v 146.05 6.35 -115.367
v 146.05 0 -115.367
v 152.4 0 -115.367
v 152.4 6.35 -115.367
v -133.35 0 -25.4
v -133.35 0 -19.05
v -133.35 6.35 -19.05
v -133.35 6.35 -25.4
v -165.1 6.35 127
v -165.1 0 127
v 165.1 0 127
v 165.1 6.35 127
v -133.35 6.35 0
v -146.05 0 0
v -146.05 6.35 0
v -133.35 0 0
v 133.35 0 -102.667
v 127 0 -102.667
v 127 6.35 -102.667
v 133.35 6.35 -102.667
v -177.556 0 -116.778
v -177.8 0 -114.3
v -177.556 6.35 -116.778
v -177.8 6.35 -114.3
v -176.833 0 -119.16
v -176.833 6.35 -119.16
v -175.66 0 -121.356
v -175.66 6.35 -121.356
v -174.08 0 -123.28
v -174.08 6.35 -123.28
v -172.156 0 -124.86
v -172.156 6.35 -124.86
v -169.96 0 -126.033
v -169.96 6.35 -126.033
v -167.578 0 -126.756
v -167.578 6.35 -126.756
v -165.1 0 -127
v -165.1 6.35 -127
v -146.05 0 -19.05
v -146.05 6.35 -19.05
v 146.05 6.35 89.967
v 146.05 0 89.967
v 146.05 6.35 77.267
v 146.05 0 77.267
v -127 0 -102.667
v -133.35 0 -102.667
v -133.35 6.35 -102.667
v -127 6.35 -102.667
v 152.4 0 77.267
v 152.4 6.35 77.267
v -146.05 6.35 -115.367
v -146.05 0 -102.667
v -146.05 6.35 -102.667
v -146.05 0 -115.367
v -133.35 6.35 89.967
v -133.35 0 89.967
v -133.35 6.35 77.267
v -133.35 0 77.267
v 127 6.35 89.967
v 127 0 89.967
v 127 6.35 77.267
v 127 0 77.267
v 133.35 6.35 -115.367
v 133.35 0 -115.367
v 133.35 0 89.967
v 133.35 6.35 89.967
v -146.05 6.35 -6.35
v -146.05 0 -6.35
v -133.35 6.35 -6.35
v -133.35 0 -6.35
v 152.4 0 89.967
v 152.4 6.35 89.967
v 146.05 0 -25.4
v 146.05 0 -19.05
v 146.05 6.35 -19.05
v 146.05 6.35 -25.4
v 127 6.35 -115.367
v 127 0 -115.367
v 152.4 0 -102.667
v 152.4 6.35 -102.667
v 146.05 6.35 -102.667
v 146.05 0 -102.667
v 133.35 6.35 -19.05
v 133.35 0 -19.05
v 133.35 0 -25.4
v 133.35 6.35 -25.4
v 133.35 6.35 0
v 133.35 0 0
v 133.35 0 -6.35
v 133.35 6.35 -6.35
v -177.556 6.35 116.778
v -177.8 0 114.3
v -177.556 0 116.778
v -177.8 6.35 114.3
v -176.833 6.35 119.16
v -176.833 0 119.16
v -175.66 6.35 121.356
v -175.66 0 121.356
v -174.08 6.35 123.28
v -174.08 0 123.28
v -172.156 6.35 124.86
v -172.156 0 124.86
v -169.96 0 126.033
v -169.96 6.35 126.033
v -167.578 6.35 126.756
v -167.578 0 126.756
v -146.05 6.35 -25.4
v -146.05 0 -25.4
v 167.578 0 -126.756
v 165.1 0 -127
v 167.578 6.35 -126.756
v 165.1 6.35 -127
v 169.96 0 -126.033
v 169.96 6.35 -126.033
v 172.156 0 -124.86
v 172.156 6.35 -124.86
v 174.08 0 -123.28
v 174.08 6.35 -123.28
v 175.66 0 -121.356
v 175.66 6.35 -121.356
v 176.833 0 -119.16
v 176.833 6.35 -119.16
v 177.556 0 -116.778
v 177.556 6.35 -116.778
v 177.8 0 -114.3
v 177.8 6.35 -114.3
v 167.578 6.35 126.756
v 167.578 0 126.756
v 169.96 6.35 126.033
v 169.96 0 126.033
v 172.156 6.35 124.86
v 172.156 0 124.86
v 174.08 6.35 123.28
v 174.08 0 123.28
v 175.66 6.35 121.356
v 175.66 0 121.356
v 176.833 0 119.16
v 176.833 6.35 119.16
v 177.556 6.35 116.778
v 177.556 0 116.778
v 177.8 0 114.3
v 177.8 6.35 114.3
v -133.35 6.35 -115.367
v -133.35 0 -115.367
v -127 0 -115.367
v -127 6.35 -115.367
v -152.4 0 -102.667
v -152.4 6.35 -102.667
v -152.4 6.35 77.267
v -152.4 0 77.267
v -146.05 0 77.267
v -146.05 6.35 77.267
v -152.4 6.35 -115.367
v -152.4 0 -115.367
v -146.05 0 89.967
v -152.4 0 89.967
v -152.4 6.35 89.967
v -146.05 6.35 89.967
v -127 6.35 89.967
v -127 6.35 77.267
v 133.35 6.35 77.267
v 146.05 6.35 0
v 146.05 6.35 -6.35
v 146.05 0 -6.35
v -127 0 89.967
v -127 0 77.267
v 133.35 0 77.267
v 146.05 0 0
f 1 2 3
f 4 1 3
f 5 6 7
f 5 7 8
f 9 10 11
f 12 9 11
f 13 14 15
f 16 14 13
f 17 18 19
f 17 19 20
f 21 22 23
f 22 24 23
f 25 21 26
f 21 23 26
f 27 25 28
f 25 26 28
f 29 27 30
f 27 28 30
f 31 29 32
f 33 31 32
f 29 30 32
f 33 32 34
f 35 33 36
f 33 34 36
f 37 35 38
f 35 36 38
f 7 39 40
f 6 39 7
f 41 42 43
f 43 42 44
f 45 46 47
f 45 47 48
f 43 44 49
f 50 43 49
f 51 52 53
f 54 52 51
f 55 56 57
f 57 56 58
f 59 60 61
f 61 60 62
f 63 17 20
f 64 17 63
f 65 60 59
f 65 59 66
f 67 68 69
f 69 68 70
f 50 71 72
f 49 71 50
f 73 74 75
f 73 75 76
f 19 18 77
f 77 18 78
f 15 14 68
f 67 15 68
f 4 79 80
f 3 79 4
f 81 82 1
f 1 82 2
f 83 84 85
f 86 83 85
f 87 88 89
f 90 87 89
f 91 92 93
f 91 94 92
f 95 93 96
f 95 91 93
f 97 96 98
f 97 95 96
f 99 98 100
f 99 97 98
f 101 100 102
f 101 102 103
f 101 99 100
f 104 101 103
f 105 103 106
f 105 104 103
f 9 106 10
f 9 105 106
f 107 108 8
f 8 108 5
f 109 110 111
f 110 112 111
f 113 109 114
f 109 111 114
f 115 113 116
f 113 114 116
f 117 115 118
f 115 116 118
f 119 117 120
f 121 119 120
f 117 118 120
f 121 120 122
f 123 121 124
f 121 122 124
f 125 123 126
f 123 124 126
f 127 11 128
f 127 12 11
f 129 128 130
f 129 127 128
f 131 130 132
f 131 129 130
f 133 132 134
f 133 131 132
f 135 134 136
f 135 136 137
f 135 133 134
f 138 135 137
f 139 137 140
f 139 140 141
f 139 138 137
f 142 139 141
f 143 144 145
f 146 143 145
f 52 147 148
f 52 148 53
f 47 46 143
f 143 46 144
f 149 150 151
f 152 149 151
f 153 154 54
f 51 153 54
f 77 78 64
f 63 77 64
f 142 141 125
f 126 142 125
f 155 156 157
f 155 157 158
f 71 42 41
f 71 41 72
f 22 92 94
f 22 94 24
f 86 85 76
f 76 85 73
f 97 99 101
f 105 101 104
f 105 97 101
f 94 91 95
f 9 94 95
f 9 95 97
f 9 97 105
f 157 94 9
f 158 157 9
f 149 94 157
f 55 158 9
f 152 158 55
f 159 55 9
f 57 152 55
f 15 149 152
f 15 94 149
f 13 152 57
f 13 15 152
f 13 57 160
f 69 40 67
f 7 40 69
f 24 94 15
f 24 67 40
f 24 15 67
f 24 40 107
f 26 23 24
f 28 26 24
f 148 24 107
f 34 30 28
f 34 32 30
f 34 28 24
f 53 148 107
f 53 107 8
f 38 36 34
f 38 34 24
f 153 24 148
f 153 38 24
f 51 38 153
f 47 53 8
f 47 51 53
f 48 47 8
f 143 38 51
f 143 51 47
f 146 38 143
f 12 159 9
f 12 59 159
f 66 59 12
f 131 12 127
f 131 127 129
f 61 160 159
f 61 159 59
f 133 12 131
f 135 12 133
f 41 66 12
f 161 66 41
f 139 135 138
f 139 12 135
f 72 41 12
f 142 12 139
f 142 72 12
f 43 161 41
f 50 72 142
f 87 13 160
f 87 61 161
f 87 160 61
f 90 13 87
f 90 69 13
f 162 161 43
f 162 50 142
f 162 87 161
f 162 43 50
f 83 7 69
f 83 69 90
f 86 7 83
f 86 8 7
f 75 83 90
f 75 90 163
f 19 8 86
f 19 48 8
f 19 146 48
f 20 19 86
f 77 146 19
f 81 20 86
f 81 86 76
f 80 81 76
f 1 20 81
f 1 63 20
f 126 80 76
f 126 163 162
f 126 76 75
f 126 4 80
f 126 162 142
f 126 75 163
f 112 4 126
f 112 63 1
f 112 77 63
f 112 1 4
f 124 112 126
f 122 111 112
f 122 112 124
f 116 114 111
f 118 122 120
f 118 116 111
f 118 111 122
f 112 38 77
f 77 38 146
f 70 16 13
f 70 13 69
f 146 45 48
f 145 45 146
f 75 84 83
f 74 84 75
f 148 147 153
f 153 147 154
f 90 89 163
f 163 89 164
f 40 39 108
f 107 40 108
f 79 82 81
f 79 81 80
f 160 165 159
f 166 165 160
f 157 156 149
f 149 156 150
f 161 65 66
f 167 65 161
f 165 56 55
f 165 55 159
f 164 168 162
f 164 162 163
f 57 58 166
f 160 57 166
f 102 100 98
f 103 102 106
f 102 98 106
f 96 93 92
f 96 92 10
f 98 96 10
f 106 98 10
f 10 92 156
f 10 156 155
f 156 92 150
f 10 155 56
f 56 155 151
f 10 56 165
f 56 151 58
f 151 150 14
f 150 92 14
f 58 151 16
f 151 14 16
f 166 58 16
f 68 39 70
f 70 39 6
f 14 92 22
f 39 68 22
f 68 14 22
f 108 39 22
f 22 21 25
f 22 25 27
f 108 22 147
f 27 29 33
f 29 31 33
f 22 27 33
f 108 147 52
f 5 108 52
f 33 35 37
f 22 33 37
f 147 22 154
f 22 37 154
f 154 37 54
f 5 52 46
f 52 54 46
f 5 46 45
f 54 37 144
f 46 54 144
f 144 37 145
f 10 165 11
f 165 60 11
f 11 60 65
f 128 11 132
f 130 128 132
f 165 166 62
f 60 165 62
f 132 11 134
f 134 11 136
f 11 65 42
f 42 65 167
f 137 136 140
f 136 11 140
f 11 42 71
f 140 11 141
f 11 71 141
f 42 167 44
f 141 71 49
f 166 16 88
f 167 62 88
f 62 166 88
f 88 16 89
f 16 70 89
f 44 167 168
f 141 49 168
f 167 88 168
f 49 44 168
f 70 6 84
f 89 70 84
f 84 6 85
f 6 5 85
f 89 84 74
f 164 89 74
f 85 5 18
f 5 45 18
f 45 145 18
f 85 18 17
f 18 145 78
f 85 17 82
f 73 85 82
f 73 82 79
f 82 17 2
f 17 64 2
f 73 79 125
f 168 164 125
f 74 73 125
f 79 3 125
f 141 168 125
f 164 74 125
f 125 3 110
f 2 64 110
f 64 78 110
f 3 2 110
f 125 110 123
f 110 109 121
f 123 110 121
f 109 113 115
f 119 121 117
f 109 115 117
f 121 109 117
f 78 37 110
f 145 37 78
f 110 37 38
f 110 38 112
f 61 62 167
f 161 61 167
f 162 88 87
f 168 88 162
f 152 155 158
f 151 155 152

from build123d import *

# Parameters (mm, degrees)
ESQUISSE2_W                  = 355.6
ESQUISSE2_H                  = 254
BOSS_EXTRU_1_DEPTH           = 6.35
ENL_V_MAT_EXTRU_1_DEPTH      = 219.591313871
ENL_V_MAT_EXTRU_1_DEPTH_BACK = 219.591313871
ESQUISSE3_W                  = 12.7
ESQUISSE3_H                  = 6.35
ESQUISSE3_W_2                = 6.35
ESQUISSE3_H_2                = 12.7
CONG_1_R                     = 12.7


with BuildPart() as part:
    # Esquisse2 → Boss.-Extru.1 (new body)
    with BuildSketch(Plane(origin=(0, 0, 0), x_dir=(1, 0, 0), z_dir=(0, 1, 0))):
        Rectangle(ESQUISSE2_W, ESQUISSE2_H)
    extrude(amount=BOSS_EXTRU_1_DEPTH)

    # Esquisse3 → Enlèv. mat.-Extru.1 (cut, two sides: drawn at the far end of the back side and taken through both)
    with BuildSketch(Plane(origin=(0, 6.35, 0), x_dir=(1, 0, 0), z_dir=(0, 1, 0)).offset(-ENL_V_MAT_EXTRU_1_DEPTH_BACK)):
        with Locations((-139.7, 22.225)):
            Rectangle(ESQUISSE3_W, ESQUISSE3_H)
        with Locations((-139.7, 3.175)):
            Rectangle(ESQUISSE3_W, ESQUISSE3_H)
        with Locations((-130.175, -83.6168)):
            Rectangle(ESQUISSE3_W_2, ESQUISSE3_H_2)
        with Locations((-149.225, 109.0168)):
            Rectangle(ESQUISSE3_W_2, ESQUISSE3_H_2)
        with Locations((-130.175, 109.0168)):
            Rectangle(ESQUISSE3_W_2, ESQUISSE3_H_2)
        with Locations((-149.225, -83.6168)):
            Rectangle(ESQUISSE3_W_2, ESQUISSE3_H_2)
        with Locations((149.225, -83.6168)):
            Rectangle(ESQUISSE3_W_2, ESQUISSE3_H_2)
        with Locations((130.175, -83.6168)):
            Rectangle(ESQUISSE3_W_2, ESQUISSE3_H_2)
        with Locations((130.175, 109.0168)):
            Rectangle(ESQUISSE3_W_2, ESQUISSE3_H_2)
        with Locations((149.225, 109.0168)):
            Rectangle(ESQUISSE3_W_2, ESQUISSE3_H_2)
        with Locations((139.7, 3.175)):
            Rectangle(ESQUISSE3_W, ESQUISSE3_H)
        with Locations((139.7, 22.225)):
            Rectangle(ESQUISSE3_W, ESQUISSE3_H)
    extrude(amount=ENL_V_MAT_EXTRU_1_DEPTH + ENL_V_MAT_EXTRU_1_DEPTH_BACK, mode=Mode.SUBTRACT)

    # Congé1
    cong_1_edges = [part.edges().sort_by_distance(p)[0] for p in [
        (177.8, 3.175, 127),
        (-177.8, 3.175, 127),
        (-177.8, 3.175, -127),
        (177.8, 3.175, -127),
    ]]
    fillet(cong_1_edges, radius=CONG_1_R)


solid = part.part
